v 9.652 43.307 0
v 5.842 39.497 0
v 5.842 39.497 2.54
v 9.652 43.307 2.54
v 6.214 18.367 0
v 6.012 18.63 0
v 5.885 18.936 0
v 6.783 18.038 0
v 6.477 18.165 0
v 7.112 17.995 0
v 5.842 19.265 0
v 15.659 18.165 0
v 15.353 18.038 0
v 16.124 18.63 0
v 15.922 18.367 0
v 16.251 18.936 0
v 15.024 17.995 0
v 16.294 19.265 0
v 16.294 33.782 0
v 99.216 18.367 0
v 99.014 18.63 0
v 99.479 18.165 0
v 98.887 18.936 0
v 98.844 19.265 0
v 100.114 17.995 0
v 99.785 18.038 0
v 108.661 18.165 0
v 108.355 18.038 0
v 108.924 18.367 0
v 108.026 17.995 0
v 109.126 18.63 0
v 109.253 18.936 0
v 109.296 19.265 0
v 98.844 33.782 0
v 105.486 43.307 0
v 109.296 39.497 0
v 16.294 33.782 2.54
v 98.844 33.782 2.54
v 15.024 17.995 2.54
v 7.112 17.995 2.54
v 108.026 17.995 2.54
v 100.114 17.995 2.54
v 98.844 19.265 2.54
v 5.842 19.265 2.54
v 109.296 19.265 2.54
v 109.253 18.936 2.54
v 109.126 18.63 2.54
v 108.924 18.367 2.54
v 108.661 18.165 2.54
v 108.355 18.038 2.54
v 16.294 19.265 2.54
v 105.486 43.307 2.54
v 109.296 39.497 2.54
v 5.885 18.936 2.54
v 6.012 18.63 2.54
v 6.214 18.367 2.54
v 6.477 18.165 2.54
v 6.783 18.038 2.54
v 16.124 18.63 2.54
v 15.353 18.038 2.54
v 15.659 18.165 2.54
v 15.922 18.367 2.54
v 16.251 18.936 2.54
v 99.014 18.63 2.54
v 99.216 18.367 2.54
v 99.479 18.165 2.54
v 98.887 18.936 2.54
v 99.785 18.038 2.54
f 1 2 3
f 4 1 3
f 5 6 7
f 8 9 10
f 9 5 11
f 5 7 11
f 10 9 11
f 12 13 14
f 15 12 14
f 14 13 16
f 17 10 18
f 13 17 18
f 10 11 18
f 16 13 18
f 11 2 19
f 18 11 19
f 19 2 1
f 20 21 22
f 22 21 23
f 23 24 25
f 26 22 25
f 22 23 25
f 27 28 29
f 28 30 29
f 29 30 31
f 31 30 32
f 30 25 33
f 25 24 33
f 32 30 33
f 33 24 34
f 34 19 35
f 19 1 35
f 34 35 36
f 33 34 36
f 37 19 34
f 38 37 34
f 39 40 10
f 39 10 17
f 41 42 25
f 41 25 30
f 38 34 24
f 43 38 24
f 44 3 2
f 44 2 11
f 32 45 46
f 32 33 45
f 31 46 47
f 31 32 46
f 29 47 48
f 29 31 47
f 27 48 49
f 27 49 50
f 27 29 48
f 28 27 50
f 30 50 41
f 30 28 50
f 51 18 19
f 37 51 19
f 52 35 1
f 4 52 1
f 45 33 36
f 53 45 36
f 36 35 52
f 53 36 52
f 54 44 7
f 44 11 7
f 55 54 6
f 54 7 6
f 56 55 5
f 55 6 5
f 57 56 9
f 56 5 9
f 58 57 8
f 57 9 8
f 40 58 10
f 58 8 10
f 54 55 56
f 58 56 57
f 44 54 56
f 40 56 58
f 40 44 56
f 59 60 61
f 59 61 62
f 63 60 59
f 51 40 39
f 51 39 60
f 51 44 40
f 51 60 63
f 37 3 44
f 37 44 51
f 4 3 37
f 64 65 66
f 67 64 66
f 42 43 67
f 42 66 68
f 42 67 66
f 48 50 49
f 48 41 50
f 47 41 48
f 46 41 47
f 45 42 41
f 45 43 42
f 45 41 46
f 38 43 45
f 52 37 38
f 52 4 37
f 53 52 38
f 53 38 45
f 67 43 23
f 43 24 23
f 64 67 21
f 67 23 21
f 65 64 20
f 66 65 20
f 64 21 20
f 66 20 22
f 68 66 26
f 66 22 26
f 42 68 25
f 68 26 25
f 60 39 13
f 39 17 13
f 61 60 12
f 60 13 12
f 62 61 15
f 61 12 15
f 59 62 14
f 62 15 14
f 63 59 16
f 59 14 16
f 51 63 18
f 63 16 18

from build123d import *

# Parameters (mm, degrees)
BOSS_EXTRUDE1_DEPTH = 2.54
CHAMFER1_SIZE       = 3.81
CUT_EXTRUDE1_DEPTH  = 124.039639744
CUT_EXTRUDE2_DEPTH  = 124.039639744
FILLET1_R           = 1.27


with BuildPart() as part:
    # Sketch1 → Boss-Extrude1 (new body)
    with BuildSketch(Plane.XY):
        Polygon((5.842, 0), (16.2941, 0), (16.2941, 33.782), (98.8441, 33.782), (98.8441, 0), (109.2962, 0), (109.2962, 2.794), (115.1382, 2.794), (115.1382, 33.782), (109.2962, 33.782), (109.2962, 43.307), (5.842, 43.307), (5.842, 33.782), (0, 33.782), (0, 2.794), (5.842, 2.794), align=None)
    extrude(amount=BOSS_EXTRUDE1_DEPTH)

    # Chamfer1
    chamfer1_edges = [part.edges().sort_by_distance(p)[0] for p in [
        (5.842, 43.307, 1.27),
        (109.2962, 43.307, 1.27),
    ]]
    chamfer(chamfer1_edges, length=CHAMFER1_SIZE)

    # Sketch2 → Cut-Extrude1 (cut, through all)
    with BuildSketch(Plane.XY.offset(2.54)):
        Polygon((0, 33.782), (5.842, 33.782), (5.842, 17.995192435), (16.2941, 17.995192435), (16.2941, -3.098792672), (0, -3.098792672), align=None)
    extrude(amount=-CUT_EXTRUDE1_DEPTH, mode=Mode.SUBTRACT)

    # Sketch3 → Cut-Extrude2 (cut, through all)
    with BuildSketch(Plane.XY.offset(2.54)):
        Polygon((109.2962, 33.782), (115.1382, 33.782), (115.1382, -2.224430595), (98.8441, 0), (42.867468811, 17.995192435), (109.2962, 17.995192435), align=None)
    extrude(amount=-CUT_EXTRUDE2_DEPTH, mode=Mode.SUBTRACT)

    # Fillet1
    fillet1_edges = [part.edges().sort_by_distance(p)[0] for p in [
        (16.2941, 17.995192435, 1.27),
        (5.842, 17.995192435, 1.27),
        (98.8441, 17.995192435, 1.27),
        (109.2962, 17.995192435, 1.27),
    ]]
    fillet(fillet1_edges, radius=FILLET1_R)


solid = part.part
